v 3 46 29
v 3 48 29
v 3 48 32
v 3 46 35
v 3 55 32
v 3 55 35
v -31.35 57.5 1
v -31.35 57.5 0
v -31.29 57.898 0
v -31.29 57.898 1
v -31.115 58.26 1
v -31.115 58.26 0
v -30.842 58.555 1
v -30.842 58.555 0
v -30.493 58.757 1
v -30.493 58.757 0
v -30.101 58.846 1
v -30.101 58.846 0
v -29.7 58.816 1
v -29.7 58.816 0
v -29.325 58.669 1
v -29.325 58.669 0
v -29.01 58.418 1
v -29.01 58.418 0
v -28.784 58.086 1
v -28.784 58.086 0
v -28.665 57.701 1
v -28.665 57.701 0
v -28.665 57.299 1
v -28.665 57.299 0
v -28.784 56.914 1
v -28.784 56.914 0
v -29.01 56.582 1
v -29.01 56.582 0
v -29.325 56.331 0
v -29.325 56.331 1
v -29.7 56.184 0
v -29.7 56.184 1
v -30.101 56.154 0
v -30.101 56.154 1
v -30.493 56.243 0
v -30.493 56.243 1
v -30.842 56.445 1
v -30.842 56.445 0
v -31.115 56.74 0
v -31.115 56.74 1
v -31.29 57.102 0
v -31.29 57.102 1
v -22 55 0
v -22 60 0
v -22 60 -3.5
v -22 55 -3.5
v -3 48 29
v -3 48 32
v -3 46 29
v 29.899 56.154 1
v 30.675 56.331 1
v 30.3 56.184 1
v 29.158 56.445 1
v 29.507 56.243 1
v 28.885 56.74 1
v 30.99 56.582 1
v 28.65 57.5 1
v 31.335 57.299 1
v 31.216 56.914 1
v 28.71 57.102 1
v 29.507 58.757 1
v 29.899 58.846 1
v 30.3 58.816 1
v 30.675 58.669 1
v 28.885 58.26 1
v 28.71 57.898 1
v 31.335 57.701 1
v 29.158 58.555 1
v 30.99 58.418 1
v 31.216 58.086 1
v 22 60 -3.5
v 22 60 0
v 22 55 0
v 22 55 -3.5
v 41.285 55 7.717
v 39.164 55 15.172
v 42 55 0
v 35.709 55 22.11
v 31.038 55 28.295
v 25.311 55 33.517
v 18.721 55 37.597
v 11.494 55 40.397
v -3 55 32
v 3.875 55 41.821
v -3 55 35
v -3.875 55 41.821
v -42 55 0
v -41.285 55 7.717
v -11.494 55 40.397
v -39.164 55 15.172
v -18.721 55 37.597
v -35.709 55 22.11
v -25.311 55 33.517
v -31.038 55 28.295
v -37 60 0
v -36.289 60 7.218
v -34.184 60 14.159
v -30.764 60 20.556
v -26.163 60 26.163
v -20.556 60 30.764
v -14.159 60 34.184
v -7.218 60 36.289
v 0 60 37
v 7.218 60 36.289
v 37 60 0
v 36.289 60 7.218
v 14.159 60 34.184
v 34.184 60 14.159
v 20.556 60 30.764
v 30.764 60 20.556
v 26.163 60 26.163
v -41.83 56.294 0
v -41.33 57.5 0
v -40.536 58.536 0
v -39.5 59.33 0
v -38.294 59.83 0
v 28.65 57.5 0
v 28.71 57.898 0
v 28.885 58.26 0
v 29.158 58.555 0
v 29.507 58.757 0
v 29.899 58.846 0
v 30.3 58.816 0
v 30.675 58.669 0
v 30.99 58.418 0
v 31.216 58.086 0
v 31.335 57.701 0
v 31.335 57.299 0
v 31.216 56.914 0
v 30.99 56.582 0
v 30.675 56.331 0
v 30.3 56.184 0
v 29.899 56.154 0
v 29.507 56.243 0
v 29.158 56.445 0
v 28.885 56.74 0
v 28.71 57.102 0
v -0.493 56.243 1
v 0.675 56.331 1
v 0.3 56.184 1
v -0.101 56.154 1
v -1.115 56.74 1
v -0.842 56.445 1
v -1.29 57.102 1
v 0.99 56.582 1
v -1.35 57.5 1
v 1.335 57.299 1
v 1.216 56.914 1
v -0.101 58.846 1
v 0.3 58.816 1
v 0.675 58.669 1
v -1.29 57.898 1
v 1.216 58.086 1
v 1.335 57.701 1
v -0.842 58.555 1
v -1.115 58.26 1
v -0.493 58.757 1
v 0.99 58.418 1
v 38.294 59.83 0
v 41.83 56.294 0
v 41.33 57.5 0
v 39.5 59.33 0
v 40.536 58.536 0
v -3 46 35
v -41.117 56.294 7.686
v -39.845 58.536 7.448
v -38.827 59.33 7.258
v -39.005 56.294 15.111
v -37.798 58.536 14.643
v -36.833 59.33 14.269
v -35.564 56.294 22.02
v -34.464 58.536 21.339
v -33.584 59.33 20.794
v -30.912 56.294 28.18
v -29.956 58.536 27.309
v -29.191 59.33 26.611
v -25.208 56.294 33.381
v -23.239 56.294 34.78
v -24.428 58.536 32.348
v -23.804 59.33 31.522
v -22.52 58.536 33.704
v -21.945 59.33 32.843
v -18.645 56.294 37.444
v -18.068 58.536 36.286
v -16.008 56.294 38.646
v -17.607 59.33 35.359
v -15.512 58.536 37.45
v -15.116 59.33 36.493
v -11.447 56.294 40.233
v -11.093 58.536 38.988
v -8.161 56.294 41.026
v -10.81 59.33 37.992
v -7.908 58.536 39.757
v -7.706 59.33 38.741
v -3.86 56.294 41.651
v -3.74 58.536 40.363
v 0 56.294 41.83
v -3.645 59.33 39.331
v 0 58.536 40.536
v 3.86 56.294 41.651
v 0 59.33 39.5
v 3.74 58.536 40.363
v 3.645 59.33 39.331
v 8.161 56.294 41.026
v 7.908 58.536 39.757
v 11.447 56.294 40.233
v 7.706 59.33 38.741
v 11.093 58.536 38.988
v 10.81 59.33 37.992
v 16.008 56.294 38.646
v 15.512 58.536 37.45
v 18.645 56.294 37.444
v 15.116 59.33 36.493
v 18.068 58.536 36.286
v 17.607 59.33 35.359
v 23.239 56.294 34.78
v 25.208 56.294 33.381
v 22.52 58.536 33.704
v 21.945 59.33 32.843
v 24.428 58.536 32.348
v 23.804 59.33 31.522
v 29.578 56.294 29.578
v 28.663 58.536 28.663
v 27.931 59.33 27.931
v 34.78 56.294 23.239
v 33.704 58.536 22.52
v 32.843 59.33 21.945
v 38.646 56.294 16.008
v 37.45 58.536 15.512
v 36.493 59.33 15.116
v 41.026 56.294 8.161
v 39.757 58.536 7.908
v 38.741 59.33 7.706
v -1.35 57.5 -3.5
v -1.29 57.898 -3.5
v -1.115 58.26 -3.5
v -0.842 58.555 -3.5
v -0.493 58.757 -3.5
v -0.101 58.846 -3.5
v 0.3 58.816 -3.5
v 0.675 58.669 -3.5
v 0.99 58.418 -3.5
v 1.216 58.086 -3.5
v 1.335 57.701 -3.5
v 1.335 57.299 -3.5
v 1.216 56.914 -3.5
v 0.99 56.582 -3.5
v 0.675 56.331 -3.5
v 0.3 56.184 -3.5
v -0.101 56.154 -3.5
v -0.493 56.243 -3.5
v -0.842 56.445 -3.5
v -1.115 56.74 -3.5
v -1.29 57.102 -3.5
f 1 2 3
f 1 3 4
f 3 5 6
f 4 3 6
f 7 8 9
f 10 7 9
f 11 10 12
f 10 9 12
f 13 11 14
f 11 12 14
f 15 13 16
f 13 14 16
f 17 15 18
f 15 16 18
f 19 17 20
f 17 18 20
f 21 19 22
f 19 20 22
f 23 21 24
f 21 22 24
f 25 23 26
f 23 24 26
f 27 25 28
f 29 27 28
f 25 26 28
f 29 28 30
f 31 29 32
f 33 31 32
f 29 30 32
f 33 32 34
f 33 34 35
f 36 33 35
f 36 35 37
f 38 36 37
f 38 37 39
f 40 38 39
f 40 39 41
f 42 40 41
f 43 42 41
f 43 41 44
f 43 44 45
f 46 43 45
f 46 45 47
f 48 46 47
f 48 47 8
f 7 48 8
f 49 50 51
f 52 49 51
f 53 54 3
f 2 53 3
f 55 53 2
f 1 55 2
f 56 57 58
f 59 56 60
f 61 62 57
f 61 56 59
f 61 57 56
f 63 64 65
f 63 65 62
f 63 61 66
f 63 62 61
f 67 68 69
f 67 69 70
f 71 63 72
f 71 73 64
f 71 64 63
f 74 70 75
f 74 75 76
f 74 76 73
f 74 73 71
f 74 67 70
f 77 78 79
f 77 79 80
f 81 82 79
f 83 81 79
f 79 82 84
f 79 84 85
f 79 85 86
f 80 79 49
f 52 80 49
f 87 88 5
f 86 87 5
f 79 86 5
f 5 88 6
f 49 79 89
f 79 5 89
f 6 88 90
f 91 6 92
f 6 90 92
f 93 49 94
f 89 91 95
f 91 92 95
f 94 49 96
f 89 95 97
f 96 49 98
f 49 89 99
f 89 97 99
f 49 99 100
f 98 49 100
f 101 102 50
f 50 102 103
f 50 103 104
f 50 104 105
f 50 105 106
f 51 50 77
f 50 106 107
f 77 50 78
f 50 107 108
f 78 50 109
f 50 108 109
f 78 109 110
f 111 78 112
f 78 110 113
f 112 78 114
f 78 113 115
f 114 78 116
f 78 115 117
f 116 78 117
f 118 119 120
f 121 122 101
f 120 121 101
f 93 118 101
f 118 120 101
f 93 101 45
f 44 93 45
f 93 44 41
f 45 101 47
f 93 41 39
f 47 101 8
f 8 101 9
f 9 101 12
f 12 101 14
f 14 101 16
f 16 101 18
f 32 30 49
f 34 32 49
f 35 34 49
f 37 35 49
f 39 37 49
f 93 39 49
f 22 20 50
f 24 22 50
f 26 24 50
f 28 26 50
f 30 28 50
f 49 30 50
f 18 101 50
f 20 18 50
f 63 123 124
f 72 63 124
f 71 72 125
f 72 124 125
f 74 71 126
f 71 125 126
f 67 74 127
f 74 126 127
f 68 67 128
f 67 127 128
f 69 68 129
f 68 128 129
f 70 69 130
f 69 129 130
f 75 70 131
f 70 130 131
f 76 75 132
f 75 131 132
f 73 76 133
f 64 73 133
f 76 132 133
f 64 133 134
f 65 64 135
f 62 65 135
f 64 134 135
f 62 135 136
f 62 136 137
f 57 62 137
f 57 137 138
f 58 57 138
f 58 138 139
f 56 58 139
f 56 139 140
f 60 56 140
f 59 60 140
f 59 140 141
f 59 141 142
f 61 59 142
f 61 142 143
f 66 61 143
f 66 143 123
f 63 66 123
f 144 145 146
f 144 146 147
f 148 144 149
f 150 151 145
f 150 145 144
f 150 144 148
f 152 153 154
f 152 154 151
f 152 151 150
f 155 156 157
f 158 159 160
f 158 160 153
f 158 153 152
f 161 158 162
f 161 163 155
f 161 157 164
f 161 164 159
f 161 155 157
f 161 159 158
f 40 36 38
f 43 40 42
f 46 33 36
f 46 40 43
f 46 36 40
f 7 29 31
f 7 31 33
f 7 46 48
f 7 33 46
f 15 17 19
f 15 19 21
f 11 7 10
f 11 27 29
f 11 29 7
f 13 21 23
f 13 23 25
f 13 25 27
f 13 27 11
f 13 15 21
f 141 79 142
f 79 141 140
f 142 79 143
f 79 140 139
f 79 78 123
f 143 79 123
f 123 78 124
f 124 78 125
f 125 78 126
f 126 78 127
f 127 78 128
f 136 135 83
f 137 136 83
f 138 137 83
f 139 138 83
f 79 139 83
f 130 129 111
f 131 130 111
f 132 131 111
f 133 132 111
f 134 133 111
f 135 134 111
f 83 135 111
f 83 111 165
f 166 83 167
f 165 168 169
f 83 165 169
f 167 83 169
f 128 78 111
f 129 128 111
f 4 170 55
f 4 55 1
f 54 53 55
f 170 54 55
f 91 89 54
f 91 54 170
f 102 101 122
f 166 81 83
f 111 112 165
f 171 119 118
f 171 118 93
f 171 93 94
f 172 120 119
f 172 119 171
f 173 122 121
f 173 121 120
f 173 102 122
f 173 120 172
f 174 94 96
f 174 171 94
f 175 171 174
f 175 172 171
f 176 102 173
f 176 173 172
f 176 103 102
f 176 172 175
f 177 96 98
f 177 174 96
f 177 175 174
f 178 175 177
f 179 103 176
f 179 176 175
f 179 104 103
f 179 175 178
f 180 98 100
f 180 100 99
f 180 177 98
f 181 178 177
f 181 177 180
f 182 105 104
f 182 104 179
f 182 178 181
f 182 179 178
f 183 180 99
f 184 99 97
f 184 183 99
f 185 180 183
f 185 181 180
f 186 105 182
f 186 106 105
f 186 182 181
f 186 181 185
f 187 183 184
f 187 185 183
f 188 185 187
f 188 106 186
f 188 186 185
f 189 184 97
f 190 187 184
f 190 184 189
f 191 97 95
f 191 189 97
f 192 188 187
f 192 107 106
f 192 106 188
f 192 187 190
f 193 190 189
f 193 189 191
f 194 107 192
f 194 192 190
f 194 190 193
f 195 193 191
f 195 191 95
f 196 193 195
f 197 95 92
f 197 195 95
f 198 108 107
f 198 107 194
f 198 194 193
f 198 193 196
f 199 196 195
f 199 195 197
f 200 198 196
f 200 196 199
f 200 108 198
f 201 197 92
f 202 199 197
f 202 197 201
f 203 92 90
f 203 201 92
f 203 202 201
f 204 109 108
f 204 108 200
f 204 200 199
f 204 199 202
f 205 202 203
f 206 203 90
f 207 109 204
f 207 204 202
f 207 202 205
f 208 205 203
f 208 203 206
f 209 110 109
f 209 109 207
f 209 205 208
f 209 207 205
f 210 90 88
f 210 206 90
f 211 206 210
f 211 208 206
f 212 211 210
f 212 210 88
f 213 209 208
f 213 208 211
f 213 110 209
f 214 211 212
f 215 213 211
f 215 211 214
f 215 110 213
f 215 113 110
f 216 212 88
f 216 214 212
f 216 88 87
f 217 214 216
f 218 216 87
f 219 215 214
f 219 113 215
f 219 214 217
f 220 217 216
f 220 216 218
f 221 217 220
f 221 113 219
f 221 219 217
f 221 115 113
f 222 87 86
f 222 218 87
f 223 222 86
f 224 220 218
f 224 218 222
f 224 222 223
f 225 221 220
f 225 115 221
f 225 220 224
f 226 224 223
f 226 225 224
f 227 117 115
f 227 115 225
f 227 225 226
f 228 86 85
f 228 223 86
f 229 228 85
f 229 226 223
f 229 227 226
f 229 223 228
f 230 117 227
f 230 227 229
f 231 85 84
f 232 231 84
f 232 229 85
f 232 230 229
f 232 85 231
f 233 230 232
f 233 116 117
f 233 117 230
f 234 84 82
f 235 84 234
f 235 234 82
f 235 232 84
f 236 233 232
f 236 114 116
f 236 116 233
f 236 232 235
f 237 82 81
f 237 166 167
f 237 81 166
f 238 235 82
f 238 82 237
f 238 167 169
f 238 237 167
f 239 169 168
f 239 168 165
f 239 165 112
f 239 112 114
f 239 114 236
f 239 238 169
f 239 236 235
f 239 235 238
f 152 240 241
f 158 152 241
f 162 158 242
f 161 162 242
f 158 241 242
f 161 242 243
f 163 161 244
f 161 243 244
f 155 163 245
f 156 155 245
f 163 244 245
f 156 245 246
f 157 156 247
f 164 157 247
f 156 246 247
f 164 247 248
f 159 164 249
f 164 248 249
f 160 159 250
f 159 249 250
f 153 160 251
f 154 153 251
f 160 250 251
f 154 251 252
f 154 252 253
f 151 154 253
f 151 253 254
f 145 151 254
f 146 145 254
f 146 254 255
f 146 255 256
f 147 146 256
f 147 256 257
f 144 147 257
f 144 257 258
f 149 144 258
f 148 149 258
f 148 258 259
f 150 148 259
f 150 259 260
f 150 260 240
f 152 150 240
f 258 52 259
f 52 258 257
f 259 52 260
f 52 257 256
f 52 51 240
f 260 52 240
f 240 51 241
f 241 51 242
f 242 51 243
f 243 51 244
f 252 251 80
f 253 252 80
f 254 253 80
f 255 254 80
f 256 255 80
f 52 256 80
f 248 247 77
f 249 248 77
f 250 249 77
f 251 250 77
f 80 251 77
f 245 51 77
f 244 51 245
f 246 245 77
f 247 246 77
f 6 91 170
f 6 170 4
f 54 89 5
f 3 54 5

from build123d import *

# Parameters (mm, degrees)
CUT_EXTRUDE1_DEPTH       = 5
CUT_EXTRUDE3_DEPTH       = 45
SKETCH8_R                = 40
CUT_EXTRUDE4_DEPTH       = 32
SKETCH9_R                = 32
SKETCH9_R_2              = 24.5
CUT_EXTRUDE5_DEPTH       = 14
SKETCH10_R               = 26
CUT_EXTRUDE6_DEPTH       = 14
FILLET1_R                = 7
FILLET2_R                = 7
CUT_REVOLVE1_START       = 22
CUT_REVOLVE1_DEPTH       = 30.5
CUT_EXTRUDE12_DEPTH      = 5
SKETCH18_W               = 13
SKETCH18_H               = 8
CUT_EXTRUDE13_DEPTH      = 5
INTERSECT1_OUTLINE_R     = 42
INTERSECT1_DEPTH         = 55
SKETCH20_W               = 6
SKETCH20_H               = 3
BOSS_EXTRUDE1_DEPTH      = 8
BOSS_EXTRUDE2_DEPTH      = 1
BOSS_EXTRUDE2_DEPTH_BACK = 1
SKETCH21_W               = 6
SKETCH21_H               = 6
BOSS_EXTRUDE3_DEPTH      = 7
SKETCH19_R               = 1.35
CUT_EXTRUDE14_DEPTH      = 8
SKETCH23_W               = 20
SKETCH23_H               = 7
CUT_EXTRUDE15_DEPTH      = 7
SKETCH24_W               = 44
SKETCH24_H               = 3.5
CUT_EXTRUDE16_DEPTH      = 5


with BuildPart() as part:
    # Sketch1 → Revolve1 (revolve)
    with BuildSketch(Plane.XY, mode=Mode.PRIVATE) as revolve1_sk:
        with BuildLine():
            Line((22.5, 0), (32, 0))
            ThreePointArc((32, 0), (33.414213562, 0.585786438), (34, 2))
            Line((34, 2), (34, 18))
            Line((34, 18), (40, 18))
            ThreePointArc((40, 18), (41.414213562, 18.585786438), (42, 20))
            Line((42, 20), (42, 55))
            ThreePointArc((42, 55), (40.535533906, 58.535533906), (37, 60))
            Line((37, 60), (0, 60))
            Line((0, 60), (0, 18))
            Line((0, 18), (22.5, 18))
            Line((22.5, 18), (22.5, 0))
        make_face()
    revolve(revolve1_sk.sketch.rotate(Axis((0, 2, 0), (0, 1, 0)), 90), axis=Axis((0, 2, 0), (0, 1, 0)))

    # Sketch5 → Cut-Extrude1 (cut)
    with BuildSketch(Plane(origin=(0, 60, 0), x_dir=(1, 0, 0), z_dir=(0, 1, 0))):
        with BuildLine():
            Line((-42, 0), (-40, 0))
            Line((-40, 0), (40, 0))
            Line((40, 0), (42, 0))
            ThreePointArc((42, 0), (0, 42), (-42, 0))
        make_face()
    extrude(amount=-CUT_EXTRUDE1_DEPTH, mode=Mode.SUBTRACT)

    # Sketch7 → Cut-Extrude3 (cut)
    with BuildSketch(Plane.XZ.offset(-18)):
        with BuildLine():
            Line((-21, 0), (21, 0))
            ThreePointArc((21, 0), (0, -21), (-21, 0))
        make_face()
    extrude(amount=-CUT_EXTRUDE3_DEPTH, mode=Mode.SUBTRACT)

    # Sketch8 → Cut-Extrude4 (cut)
    with BuildSketch(Plane(origin=(0, 52.5, 0), x_dir=(1, 0, 0), z_dir=(0, 1, 0))):
        with Locations(Location((0, 0, 0), (0, 0, 270))):
            Circle(SKETCH8_R)
        with BuildLine():
            Line((22.912878475, -2), (-22.912878475, -2))
            ThreePointArc((-22.912878475, -2), (0, 23), (22.912878475, -2))
        make_face(mode=Mode.SUBTRACT)
    extrude(amount=-CUT_EXTRUDE4_DEPTH, mode=Mode.SUBTRACT)

    # Sketch9 → Cut-Extrude5 (cut)
    with BuildSketch(Plane(origin=(0, 2, 0), x_dir=(-1, 0, 0), z_dir=(0, -1, 0))):
        with Locations(Location((0, 0, 0), (0, 0, 90))):
            Circle(SKETCH9_R)
        with Locations(Location((0, 0, 0), (0, 0, 90))):
            Circle(SKETCH9_R_2, mode=Mode.SUBTRACT)
    extrude(amount=-CUT_EXTRUDE5_DEPTH, mode=Mode.SUBTRACT)

    # Sketch10 → Cut-Extrude6 (cut)
    with BuildSketch(Plane(origin=(0, 2, 0), x_dir=(-1, 0, 0), z_dir=(0, -1, 0))):
        Circle(SKETCH10_R)
    extrude(amount=-CUT_EXTRUDE6_DEPTH, mode=Mode.SUBTRACT)

    # Fillet1
    fillet1_edges = [part.edges().sort_by_distance(p)[0] for p in [
        (21, 36.5, 0),
        (-21, 36.5, 0),
    ]]
    fillet(fillet1_edges, radius=FILLET1_R)

    # Fillet2
    fillet2_edges = [part.edges().sort_by_distance(p)[0] for p in [
        (-22.912878475, 36.5, 2),
        (22.912878475, 36.5, 2),
    ]]
    fillet(fillet2_edges, radius=FILLET2_R)

    # Cut-Revolve1: read off the stored shape, not the designer's step
    # Cut-Revolve1 outline → Cut-Revolve1 (cut)
    with BuildSketch(Plane(origin=(0, 0, 0), x_dir=(1, 0, 0), z_dir=(0, 1, 0)).offset(CUT_REVOLVE1_START)):
        with BuildLine():
            Line((-34.641016151, -20), (-36.373066959, -21))
            ThreePointArc((-36.373066959, -21), (0, -42), (36.373066959, -21))
            Line((36.373066959, -21), (34.641016151, -20))
            ThreePointArc((34.641016151, -20), (0, -40), (-34.641016151, -20))
        make_face()
    extrude(amount=CUT_REVOLVE1_DEPTH, mode=Mode.SUBTRACT)

    # Sketch15 → Cut-Extrude12 (cut)
    with BuildSketch(Plane(origin=(0, 20.5, 0), x_dir=(1, 0, 0), z_dir=(0, 1, 0))):
        with BuildLine():
            Line((-28.124355653, -3.514579578), (-26.124355653, -3.514579578))
            ThreePointArc((-26.124355653, -3.514579578), (-24.710142091, -2.928793141), (-24.124355653, -1.514579578))
            Line((-24.124355653, -1.514579578), (-24.124355653, 8.485420422))
            ThreePointArc((-24.124355653, 8.485420422), (-24.710142091, 9.899633984), (-26.124355653, 10.485420422))
            Line((-26.124355653, 10.485420422), (-28.124355653, 10.485420422))
            ThreePointArc((-28.124355653, 10.485420422), (-29.538569215, 9.899633984), (-30.124355653, 8.485420422))
            Line((-30.124355653, 8.485420422), (-30.124355653, -1.514579578))
            ThreePointArc((-30.124355653, -1.514579578), (-29.538569215, -2.928793141), (-28.124355653, -3.514579578))
        make_face()
    extrude(amount=-CUT_EXTRUDE12_DEPTH, mode=Mode.SUBTRACT)

    # Sketch18 → Cut-Extrude13 (cut)
    with BuildSketch(Plane(origin=(0, 55, 0), x_dir=(1, 0, 0), z_dir=(0, 1, 0))):
        with Locations((0.796512215, 32.951769165)):
            Rectangle(SKETCH18_W, SKETCH18_H)
    extrude(amount=-CUT_EXTRUDE13_DEPTH, mode=Mode.SUBTRACT)

    # Intersect1: read off the stored shape, not the designer's step
    # Intersect1 outline → Intersect1 (cut)
    with BuildSketch(Plane(origin=(0, 0, 0), x_dir=(1, 0, 0), z_dir=(0, 1, 0))):
        Circle(INTERSECT1_OUTLINE_R)
        with BuildLine():
            Line((12.124355653, 0), (-12.124355653, 0))
            ThreePointArc((-12.124355653, 0), (-18.186533479, 3.5), (-18.186533479, 10.5))
            ThreePointArc((-18.186533479, 10.5), (0, 21), (18.186533479, 10.5))
            ThreePointArc((18.186533479, 10.5), (18.186533479, 3.5), (12.124355653, 0))
        make_face(mode=Mode.SUBTRACT)
    extrude(amount=INTERSECT1_DEPTH, mode=Mode.SUBTRACT)

    # Sketch20 → Boss-Extrude1 (add)
    with BuildSketch(Plane.XZ.offset(-55)):
        with Locations((0, 33.5)):
            Rectangle(SKETCH20_W, SKETCH20_H)
    extrude(amount=BOSS_EXTRUDE1_DEPTH)

    # Sketch21 → Boss-Extrude2 (add, two sides: drawn at the far end of the back side and taken through both)
    with BuildSketch(Plane.XZ.offset(-47).offset(-BOSS_EXTRUDE2_DEPTH_BACK)):
        with Locations((0, 32)):
            Rectangle(SKETCH21_W, SKETCH21_H)
    extrude(amount=BOSS_EXTRUDE2_DEPTH + BOSS_EXTRUDE2_DEPTH_BACK)

    # Sketch22 → Boss-Extrude3 (add)
    with BuildSketch(Plane(origin=(0, 0, 0), x_dir=(-1, 0, 0), z_dir=(0, 0, -1))):
        with BuildLine():
            Line((-42, 55), (42, 55))
            ThreePointArc((42, 55), (40.535533906, 58.535533906), (37, 60))
            Line((37, 60), (-37, 60))
            ThreePointArc((-37, 60), (-40.535533906, 58.535533906), (-42, 55))
        make_face()
    extrude(amount=BOSS_EXTRUDE3_DEPTH)

    # Sketch19 → Cut-Extrude14 (cut)
    with BuildSketch(Plane(origin=(0, 0, -7), x_dir=(-1, 0, 0), z_dir=(0, 0, -1))):
        with Locations((0, 57.5)):
            Circle(SKETCH19_R)
        with Locations((-30, 57.5)):
            Circle(SKETCH19_R)
        with Locations((30, 57.5)):
            Circle(SKETCH19_R)
    extrude(amount=-CUT_EXTRUDE14_DEPTH, mode=Mode.SUBTRACT)

    # Sketch23 → Cut-Extrude15 (cut)
    with BuildSketch(Plane(origin=(0, 60, 0), x_dir=(1, 0, 0), z_dir=(0, 1, 0))):
        with Locations((-32, 3.5)):
            Rectangle(SKETCH23_W, SKETCH23_H)
        with Locations((32, 3.5)):
            Rectangle(SKETCH23_W, SKETCH23_H)
    extrude(amount=-CUT_EXTRUDE15_DEPTH, mode=Mode.SUBTRACT)

    # Sketch24 → Cut-Extrude16 (cut)
    with BuildSketch(Plane(origin=(0, 60, 0), x_dir=(1, 0, 0), z_dir=(0, 1, 0))):
        with Locations((0, 5.25)):
            Rectangle(SKETCH24_W, SKETCH24_H)
    extrude(amount=-CUT_EXTRUDE16_DEPTH, mode=Mode.SUBTRACT)


solid = part.part
